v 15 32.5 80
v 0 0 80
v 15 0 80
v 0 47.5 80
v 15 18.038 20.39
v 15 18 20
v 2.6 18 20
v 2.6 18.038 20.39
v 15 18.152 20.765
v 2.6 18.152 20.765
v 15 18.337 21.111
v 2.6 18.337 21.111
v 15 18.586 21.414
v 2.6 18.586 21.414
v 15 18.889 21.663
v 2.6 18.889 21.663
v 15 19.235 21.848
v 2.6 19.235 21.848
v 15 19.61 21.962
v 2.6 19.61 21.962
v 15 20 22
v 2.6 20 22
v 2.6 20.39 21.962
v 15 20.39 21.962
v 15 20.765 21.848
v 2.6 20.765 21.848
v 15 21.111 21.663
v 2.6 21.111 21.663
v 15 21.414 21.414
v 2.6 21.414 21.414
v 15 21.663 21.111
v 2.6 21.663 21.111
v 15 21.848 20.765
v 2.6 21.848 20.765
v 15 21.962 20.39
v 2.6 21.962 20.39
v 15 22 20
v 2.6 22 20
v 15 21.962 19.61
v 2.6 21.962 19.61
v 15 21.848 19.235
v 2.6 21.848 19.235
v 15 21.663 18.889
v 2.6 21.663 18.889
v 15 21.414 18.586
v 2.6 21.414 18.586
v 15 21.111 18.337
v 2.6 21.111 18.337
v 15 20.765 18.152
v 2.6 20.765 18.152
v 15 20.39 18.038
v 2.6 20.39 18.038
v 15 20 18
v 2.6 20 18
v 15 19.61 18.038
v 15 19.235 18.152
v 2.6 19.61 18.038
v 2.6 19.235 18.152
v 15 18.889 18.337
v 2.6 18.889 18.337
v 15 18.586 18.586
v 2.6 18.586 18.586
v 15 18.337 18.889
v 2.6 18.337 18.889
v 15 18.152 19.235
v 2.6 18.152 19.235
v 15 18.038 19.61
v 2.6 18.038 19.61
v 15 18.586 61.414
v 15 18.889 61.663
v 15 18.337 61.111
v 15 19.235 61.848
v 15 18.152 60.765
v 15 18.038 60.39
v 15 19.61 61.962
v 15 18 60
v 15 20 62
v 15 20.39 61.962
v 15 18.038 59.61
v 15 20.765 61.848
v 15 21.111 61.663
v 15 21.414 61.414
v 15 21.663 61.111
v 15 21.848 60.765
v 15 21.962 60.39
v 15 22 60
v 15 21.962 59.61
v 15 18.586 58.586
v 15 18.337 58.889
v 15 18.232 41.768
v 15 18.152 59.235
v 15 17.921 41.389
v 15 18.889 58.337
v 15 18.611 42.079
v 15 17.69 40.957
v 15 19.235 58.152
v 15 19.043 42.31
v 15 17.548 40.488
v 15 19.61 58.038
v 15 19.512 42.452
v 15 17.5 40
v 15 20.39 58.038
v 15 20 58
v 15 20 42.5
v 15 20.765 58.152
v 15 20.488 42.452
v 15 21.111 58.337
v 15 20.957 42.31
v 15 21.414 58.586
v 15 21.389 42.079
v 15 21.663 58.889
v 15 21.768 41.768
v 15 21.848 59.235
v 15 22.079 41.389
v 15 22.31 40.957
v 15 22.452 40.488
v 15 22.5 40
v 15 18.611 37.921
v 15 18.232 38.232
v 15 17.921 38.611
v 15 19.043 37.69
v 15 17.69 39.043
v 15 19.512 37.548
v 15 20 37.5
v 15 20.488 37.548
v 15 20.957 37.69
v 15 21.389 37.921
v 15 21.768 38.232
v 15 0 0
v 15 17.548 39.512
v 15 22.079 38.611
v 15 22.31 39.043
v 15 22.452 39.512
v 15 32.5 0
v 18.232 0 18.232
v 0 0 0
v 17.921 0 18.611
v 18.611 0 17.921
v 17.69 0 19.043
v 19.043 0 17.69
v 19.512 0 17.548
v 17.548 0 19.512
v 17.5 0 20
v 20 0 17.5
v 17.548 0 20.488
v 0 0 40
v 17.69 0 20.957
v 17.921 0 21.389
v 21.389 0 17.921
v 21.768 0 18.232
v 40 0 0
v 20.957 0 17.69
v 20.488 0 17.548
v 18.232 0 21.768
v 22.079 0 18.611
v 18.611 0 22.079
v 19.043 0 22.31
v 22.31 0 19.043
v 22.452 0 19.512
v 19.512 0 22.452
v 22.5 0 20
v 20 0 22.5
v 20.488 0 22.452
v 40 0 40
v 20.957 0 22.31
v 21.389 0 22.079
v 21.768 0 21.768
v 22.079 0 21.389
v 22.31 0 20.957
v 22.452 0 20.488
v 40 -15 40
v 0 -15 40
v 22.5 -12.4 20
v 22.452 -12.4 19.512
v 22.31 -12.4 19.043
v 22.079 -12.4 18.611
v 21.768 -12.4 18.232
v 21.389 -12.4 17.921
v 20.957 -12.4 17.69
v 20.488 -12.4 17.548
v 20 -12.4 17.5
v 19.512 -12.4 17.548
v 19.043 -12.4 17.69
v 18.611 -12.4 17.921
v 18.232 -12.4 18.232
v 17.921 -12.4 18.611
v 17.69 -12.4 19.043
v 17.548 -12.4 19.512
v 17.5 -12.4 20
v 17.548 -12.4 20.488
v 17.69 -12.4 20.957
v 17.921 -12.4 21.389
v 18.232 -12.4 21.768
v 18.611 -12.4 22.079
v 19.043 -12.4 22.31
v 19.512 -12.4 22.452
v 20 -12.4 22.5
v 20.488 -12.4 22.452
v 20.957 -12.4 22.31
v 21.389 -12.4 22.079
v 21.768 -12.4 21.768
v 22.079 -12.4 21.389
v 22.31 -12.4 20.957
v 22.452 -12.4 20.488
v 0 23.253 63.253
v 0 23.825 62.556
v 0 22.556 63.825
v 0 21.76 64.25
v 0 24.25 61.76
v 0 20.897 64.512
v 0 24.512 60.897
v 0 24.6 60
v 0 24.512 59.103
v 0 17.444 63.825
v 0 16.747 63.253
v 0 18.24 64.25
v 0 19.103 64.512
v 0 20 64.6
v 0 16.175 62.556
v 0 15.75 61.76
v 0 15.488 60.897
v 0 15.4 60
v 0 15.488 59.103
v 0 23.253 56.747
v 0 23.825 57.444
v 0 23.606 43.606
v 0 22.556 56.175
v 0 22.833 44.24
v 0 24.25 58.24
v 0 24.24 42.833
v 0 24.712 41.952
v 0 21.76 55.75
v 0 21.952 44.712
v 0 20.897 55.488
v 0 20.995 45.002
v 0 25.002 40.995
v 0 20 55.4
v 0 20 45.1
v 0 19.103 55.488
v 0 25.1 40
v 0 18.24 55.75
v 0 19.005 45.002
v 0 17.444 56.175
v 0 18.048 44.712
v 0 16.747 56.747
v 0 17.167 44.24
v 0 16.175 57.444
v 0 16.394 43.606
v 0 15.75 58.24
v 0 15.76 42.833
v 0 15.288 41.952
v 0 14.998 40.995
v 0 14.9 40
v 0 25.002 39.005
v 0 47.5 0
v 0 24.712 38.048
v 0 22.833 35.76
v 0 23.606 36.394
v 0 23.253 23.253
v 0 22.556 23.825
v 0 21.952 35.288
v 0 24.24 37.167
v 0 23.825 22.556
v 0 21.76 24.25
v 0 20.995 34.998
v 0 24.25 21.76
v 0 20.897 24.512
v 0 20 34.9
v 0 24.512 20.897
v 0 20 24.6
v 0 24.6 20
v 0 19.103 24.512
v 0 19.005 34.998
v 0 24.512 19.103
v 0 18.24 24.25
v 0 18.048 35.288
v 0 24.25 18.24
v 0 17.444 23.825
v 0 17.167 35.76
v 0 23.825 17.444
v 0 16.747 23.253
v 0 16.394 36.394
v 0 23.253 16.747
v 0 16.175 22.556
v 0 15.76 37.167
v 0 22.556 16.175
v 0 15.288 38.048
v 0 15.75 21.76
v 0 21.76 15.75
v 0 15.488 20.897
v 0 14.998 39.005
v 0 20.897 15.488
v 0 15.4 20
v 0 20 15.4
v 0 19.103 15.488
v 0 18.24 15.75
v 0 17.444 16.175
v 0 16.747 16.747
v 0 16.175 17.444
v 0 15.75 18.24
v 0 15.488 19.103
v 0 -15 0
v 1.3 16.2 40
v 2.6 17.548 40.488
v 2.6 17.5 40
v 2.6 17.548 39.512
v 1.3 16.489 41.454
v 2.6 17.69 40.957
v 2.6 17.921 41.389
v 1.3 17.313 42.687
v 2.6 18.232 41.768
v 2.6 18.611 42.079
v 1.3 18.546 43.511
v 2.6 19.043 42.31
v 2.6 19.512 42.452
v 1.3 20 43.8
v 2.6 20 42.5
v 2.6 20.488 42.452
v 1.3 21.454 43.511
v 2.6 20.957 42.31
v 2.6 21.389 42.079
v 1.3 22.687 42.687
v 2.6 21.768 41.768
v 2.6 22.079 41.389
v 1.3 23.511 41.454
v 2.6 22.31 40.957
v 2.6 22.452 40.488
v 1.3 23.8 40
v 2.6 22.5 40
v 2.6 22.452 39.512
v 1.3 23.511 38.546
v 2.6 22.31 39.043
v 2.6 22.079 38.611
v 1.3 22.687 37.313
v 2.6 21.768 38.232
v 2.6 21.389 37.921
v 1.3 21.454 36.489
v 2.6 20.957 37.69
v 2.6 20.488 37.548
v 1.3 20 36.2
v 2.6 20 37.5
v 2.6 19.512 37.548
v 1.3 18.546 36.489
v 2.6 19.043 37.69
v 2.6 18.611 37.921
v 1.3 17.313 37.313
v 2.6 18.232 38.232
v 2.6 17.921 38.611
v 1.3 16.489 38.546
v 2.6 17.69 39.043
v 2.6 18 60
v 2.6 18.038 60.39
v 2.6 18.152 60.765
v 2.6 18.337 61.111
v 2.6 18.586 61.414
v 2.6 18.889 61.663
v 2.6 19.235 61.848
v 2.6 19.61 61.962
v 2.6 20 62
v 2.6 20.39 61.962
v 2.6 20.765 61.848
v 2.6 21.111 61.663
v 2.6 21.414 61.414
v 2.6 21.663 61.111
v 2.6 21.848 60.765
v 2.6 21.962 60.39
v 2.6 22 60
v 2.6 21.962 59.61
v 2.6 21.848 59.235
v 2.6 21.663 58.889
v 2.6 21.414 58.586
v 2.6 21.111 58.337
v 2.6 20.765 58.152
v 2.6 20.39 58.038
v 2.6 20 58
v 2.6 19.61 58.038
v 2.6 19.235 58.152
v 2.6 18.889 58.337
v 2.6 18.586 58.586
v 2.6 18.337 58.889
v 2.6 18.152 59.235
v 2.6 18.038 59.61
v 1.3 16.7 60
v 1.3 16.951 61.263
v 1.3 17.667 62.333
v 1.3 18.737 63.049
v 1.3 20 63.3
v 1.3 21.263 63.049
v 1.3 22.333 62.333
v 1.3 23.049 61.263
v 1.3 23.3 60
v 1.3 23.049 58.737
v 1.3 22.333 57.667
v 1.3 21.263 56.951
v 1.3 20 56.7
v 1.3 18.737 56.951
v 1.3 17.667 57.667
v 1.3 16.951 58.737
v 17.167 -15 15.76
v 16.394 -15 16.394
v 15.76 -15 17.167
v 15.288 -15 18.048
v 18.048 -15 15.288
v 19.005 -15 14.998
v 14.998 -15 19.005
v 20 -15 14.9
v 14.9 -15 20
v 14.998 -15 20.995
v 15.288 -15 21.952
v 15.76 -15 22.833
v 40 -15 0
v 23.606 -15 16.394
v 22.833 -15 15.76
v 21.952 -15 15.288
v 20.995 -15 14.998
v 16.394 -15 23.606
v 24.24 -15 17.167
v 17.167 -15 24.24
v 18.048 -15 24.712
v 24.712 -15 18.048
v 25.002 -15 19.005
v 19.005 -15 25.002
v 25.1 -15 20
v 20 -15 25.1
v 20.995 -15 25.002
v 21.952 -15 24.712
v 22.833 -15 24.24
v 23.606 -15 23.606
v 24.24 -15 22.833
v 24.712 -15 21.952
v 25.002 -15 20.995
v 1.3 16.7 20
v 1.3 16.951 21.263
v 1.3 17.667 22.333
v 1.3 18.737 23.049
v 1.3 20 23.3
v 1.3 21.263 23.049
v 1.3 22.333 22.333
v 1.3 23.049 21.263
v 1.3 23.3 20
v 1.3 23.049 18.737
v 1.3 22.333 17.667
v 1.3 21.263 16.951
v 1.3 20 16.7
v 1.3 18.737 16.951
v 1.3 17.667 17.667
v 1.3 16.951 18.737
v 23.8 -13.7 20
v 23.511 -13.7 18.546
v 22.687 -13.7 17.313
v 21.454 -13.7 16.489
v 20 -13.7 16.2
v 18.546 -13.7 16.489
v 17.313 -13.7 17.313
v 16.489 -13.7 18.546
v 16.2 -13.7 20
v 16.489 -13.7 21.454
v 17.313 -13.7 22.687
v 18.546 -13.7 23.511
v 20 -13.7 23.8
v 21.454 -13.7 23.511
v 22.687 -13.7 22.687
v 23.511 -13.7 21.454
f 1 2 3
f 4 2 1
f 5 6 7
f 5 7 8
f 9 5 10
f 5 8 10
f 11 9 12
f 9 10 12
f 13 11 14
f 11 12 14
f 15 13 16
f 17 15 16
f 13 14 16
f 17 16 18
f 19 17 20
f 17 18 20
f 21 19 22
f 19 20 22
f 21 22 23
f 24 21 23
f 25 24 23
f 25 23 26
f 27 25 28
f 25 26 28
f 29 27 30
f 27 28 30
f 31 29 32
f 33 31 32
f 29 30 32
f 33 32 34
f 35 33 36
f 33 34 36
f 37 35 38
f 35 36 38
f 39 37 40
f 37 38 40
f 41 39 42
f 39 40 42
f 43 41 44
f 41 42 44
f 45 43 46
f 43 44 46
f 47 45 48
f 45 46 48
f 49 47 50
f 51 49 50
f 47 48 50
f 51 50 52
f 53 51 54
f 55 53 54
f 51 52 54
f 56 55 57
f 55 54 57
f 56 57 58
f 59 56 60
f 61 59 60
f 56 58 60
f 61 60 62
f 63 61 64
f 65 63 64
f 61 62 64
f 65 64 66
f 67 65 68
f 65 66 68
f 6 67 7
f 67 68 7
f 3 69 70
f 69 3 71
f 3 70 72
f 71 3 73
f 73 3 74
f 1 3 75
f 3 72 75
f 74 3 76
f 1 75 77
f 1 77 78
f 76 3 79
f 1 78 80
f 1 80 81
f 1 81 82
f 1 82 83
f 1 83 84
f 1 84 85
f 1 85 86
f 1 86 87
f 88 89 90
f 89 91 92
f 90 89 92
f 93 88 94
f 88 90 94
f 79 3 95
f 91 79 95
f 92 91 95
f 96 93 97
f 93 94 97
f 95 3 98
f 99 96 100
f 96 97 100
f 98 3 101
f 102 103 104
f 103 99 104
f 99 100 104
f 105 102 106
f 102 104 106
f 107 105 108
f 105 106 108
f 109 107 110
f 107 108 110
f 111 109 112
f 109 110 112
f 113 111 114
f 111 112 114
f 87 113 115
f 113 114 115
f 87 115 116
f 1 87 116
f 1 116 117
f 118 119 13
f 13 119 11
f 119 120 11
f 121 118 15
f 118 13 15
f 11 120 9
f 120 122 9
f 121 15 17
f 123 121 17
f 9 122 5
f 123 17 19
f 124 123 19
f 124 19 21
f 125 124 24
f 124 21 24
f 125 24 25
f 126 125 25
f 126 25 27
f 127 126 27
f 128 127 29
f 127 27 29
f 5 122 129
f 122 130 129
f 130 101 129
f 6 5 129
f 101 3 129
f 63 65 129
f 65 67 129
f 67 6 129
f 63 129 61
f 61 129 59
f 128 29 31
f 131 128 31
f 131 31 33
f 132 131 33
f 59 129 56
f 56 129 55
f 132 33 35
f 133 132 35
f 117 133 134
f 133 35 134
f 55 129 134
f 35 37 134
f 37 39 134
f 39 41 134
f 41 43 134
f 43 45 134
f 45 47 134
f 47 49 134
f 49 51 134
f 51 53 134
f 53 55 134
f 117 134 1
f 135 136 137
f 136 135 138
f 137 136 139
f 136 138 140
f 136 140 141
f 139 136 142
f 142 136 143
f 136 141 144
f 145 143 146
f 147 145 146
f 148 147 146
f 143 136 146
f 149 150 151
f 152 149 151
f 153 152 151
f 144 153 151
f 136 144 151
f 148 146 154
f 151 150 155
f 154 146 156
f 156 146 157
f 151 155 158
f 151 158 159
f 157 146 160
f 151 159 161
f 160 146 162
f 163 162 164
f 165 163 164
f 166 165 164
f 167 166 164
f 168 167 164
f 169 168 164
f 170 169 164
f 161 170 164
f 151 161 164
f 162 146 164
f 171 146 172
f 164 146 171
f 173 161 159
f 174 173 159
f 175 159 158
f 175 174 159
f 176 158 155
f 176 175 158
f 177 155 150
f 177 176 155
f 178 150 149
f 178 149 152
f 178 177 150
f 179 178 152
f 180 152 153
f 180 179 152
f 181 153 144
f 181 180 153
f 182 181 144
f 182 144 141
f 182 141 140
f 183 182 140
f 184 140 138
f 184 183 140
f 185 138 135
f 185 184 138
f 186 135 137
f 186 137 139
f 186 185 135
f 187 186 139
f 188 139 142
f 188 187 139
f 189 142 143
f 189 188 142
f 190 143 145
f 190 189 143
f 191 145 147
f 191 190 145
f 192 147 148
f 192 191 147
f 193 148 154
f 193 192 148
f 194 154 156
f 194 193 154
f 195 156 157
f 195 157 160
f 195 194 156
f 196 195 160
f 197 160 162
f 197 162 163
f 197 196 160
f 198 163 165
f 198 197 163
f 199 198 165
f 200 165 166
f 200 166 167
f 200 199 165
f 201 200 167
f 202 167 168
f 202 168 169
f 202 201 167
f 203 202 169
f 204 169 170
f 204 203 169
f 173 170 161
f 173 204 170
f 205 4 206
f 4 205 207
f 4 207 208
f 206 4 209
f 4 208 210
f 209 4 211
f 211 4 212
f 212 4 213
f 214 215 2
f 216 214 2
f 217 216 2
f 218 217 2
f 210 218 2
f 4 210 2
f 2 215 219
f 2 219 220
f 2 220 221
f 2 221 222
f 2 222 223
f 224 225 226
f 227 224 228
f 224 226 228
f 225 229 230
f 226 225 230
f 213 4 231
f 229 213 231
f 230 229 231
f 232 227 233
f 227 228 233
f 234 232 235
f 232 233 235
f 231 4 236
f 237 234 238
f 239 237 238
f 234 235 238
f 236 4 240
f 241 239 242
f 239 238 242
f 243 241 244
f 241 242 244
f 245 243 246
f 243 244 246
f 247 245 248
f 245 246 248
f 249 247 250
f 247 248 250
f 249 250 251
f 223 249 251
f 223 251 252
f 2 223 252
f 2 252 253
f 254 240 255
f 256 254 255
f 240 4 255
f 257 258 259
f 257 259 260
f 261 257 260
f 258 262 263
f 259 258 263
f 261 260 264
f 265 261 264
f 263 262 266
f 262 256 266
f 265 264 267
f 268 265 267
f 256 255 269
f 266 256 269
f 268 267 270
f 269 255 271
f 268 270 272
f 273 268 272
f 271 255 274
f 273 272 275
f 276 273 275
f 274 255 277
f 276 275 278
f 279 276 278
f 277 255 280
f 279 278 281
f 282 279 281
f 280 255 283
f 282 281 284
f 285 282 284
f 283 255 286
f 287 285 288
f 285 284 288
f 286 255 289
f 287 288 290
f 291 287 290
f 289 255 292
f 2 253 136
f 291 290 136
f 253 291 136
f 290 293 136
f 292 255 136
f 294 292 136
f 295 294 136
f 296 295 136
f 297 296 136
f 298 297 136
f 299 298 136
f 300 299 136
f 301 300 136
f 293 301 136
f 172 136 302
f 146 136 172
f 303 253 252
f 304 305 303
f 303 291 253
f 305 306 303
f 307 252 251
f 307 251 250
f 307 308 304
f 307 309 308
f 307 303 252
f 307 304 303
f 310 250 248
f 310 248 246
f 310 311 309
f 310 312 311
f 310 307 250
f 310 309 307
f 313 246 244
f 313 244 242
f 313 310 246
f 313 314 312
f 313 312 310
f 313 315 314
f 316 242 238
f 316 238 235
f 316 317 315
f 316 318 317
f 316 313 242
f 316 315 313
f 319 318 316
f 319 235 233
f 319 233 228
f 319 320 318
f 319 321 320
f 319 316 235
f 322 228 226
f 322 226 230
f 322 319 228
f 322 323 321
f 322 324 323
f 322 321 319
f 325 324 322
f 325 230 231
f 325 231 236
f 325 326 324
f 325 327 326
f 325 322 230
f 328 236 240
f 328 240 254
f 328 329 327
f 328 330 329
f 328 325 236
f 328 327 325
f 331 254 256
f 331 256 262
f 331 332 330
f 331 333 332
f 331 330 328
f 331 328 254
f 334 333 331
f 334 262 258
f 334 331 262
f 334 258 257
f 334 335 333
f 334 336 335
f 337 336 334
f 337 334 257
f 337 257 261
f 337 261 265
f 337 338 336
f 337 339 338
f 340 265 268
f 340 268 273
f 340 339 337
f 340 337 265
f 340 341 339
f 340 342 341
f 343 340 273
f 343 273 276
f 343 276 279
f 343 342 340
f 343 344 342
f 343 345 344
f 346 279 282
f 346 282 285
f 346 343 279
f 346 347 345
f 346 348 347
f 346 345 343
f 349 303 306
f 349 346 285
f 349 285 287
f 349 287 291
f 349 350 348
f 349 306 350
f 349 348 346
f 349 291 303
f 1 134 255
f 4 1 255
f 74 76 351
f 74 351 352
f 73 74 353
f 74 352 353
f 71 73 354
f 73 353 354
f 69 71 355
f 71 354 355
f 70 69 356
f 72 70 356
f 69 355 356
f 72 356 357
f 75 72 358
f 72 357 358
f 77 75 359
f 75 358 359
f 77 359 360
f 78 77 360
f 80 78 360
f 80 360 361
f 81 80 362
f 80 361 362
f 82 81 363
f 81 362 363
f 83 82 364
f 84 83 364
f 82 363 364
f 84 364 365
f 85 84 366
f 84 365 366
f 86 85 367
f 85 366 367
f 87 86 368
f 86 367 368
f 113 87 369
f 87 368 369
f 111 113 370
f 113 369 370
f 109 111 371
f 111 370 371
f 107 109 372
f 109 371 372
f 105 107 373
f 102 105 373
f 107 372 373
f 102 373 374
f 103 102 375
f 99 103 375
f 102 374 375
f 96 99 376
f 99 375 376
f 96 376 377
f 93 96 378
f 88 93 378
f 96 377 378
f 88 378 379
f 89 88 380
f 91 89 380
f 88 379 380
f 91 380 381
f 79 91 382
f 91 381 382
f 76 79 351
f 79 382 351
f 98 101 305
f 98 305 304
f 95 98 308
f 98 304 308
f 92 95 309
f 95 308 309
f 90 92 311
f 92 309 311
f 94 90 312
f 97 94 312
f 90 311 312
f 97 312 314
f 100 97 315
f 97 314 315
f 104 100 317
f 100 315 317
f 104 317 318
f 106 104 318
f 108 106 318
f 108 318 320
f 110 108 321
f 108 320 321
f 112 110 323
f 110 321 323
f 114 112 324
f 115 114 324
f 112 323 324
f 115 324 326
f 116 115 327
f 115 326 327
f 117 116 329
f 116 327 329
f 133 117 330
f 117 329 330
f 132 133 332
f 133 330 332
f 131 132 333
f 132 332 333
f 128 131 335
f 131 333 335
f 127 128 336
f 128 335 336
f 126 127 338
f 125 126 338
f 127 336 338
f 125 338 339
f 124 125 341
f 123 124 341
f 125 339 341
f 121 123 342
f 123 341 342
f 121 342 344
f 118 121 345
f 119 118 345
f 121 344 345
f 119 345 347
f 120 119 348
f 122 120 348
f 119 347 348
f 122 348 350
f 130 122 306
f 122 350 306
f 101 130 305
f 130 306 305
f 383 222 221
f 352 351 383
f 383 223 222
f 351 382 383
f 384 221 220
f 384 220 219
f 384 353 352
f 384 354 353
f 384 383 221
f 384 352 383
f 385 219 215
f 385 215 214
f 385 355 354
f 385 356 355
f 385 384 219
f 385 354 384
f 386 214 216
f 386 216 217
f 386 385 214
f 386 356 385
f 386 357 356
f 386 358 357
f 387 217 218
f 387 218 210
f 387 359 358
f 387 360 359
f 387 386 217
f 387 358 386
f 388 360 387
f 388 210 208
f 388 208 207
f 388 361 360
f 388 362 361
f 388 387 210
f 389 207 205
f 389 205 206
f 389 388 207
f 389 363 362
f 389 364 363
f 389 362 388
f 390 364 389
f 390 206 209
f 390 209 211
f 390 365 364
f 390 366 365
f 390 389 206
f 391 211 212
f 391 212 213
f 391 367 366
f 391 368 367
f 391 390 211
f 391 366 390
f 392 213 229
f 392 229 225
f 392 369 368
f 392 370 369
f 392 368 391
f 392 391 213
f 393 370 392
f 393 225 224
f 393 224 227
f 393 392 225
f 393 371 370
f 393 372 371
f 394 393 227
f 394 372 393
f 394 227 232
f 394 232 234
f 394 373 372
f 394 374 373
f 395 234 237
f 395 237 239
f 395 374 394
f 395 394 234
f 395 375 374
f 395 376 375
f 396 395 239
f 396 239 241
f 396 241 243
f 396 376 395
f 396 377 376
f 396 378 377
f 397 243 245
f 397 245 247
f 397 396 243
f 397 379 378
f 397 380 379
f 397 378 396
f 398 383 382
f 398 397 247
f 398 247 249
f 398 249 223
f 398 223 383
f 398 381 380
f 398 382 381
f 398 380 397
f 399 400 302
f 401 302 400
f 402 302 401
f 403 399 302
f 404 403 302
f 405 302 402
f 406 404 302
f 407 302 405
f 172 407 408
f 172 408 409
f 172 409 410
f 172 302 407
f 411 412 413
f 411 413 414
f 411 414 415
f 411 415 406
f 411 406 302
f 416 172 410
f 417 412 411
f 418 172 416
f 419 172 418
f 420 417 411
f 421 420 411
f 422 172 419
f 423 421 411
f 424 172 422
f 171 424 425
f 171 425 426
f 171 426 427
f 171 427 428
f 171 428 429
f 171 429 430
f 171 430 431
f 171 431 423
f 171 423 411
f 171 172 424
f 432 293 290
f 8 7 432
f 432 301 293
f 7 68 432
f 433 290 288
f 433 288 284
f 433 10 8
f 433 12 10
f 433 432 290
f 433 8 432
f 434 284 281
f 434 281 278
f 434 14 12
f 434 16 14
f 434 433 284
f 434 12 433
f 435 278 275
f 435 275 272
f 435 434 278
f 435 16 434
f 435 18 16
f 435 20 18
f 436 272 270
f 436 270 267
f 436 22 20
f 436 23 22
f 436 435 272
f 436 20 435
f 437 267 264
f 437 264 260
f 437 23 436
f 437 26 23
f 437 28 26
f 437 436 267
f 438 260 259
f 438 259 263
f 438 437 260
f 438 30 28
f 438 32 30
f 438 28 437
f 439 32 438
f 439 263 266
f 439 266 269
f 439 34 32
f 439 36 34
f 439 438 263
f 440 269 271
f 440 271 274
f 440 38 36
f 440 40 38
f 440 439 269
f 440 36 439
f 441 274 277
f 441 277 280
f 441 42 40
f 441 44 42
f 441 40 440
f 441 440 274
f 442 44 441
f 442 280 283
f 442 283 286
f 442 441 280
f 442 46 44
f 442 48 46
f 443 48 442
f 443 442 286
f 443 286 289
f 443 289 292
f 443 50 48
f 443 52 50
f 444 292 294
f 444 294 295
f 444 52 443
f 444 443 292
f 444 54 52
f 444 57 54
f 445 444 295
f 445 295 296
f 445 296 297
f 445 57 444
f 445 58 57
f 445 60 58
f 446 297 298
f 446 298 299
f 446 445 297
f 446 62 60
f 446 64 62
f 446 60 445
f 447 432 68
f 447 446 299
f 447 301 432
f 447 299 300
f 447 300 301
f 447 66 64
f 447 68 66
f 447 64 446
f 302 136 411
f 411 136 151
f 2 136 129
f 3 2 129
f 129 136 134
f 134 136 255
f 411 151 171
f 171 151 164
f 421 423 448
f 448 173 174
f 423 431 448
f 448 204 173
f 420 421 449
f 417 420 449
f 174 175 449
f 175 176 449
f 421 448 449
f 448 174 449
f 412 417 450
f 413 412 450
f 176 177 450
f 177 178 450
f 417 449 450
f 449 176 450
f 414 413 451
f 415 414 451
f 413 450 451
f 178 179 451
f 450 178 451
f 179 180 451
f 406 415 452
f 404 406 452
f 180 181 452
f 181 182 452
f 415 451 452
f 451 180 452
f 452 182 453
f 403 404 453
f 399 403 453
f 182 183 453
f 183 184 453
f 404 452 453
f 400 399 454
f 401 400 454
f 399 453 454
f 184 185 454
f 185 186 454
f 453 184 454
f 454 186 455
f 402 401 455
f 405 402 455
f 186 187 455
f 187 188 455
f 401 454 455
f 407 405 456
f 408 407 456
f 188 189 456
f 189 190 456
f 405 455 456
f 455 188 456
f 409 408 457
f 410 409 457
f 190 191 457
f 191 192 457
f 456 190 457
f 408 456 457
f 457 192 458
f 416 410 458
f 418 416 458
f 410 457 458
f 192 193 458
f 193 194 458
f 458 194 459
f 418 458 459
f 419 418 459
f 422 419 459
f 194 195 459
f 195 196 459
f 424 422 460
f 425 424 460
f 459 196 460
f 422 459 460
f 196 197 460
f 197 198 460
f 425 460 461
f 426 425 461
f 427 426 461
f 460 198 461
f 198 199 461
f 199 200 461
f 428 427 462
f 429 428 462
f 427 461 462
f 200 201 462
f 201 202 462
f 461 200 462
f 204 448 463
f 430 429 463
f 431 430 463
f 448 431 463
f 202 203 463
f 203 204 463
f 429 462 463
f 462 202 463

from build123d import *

# Parameters (mm, degrees)
SKETCH001_R      = 2.5
SKETCH001_R_2    = 2
EXTRUDE001_DEPTH = 15
EXTRUDE_DEPTH    = 80
CHAMFER_SIZE     = 2.6
FACE003_R        = 2.5
EXTRUDE003_DEPTH = 15
SKETCH002_W      = 40
SKETCH002_H      = 40
EXTRUDE002_DEPTH = 15
CHAMFER001_SIZE  = 2.6


with BuildPart() as extrude001:
    # Sketch001 (on Face1 of Extrude) → Extrude001 (new body)
    with BuildSketch(Plane(origin=(0, 0, 0), x_dir=(0, -1, 0), z_dir=(-1, 0, 0))):
        with Locations((-20, 40)):
            Circle(SKETCH001_R)
        with Locations((-20, 60)):
            Circle(SKETCH001_R_2)
        with Locations((-20, 20)):
            Circle(SKETCH001_R_2)
    extrude(amount=-EXTRUDE001_DEPTH)


with BuildPart() as wedge:
    # Face → Extrude (new body)
    with BuildSketch(Plane(origin=(7.03125, 20.234375, 0), x_dir=(0, 1, 0), z_dir=(0, 0, 1))):
        Polygon((27.265625, 7.03125), (-20.234375, 7.03125), (-20.234375, -7.96875), (12.265625, -7.96875), align=None)
    extrude(amount=EXTRUDE_DEPTH)

    # Cut: cut Extrude001
    add(extrude001.part, mode=Mode.SUBTRACT)

    # Chamfer
    chamfer_edges = [wedge.edges().sort_by_distance(p)[0] for p in [
        (0, 22, 60),
        (0, 22.5, 40),
        (0, 22, 20),
    ]]
    chamfer(chamfer_edges, length=CHAMFER_SIZE)


with BuildPart() as extrude003:
    # Face003 → Extrude003 (new body)
    with BuildSketch(Plane(origin=(20, -15, 20), x_dir=(1, 0, 0), z_dir=(0, 1, 0))):
        Circle(FACE003_R)
    extrude(amount=EXTRUDE003_DEPTH)


with BuildPart() as spacer:
    # Sketch002 → Extrude002 (new body)
    with BuildSketch(Plane.XZ):
        with Locations((20, 20)):
            Rectangle(SKETCH002_W, SKETCH002_H)
    extrude(amount=EXTRUDE002_DEPTH)

    # Cut001: cut Extrude003
    add(extrude003.part, mode=Mode.SUBTRACT)

    # Chamfer001
    chamfer001_edges = [spacer.edges().sort_by_distance(p)[0] for p in [
        (17.5, -15, 20),
    ]]
    chamfer(chamfer001_edges, length=CHAMFER001_SIZE)


solid = Compound([wedge.part, spacer.part])
